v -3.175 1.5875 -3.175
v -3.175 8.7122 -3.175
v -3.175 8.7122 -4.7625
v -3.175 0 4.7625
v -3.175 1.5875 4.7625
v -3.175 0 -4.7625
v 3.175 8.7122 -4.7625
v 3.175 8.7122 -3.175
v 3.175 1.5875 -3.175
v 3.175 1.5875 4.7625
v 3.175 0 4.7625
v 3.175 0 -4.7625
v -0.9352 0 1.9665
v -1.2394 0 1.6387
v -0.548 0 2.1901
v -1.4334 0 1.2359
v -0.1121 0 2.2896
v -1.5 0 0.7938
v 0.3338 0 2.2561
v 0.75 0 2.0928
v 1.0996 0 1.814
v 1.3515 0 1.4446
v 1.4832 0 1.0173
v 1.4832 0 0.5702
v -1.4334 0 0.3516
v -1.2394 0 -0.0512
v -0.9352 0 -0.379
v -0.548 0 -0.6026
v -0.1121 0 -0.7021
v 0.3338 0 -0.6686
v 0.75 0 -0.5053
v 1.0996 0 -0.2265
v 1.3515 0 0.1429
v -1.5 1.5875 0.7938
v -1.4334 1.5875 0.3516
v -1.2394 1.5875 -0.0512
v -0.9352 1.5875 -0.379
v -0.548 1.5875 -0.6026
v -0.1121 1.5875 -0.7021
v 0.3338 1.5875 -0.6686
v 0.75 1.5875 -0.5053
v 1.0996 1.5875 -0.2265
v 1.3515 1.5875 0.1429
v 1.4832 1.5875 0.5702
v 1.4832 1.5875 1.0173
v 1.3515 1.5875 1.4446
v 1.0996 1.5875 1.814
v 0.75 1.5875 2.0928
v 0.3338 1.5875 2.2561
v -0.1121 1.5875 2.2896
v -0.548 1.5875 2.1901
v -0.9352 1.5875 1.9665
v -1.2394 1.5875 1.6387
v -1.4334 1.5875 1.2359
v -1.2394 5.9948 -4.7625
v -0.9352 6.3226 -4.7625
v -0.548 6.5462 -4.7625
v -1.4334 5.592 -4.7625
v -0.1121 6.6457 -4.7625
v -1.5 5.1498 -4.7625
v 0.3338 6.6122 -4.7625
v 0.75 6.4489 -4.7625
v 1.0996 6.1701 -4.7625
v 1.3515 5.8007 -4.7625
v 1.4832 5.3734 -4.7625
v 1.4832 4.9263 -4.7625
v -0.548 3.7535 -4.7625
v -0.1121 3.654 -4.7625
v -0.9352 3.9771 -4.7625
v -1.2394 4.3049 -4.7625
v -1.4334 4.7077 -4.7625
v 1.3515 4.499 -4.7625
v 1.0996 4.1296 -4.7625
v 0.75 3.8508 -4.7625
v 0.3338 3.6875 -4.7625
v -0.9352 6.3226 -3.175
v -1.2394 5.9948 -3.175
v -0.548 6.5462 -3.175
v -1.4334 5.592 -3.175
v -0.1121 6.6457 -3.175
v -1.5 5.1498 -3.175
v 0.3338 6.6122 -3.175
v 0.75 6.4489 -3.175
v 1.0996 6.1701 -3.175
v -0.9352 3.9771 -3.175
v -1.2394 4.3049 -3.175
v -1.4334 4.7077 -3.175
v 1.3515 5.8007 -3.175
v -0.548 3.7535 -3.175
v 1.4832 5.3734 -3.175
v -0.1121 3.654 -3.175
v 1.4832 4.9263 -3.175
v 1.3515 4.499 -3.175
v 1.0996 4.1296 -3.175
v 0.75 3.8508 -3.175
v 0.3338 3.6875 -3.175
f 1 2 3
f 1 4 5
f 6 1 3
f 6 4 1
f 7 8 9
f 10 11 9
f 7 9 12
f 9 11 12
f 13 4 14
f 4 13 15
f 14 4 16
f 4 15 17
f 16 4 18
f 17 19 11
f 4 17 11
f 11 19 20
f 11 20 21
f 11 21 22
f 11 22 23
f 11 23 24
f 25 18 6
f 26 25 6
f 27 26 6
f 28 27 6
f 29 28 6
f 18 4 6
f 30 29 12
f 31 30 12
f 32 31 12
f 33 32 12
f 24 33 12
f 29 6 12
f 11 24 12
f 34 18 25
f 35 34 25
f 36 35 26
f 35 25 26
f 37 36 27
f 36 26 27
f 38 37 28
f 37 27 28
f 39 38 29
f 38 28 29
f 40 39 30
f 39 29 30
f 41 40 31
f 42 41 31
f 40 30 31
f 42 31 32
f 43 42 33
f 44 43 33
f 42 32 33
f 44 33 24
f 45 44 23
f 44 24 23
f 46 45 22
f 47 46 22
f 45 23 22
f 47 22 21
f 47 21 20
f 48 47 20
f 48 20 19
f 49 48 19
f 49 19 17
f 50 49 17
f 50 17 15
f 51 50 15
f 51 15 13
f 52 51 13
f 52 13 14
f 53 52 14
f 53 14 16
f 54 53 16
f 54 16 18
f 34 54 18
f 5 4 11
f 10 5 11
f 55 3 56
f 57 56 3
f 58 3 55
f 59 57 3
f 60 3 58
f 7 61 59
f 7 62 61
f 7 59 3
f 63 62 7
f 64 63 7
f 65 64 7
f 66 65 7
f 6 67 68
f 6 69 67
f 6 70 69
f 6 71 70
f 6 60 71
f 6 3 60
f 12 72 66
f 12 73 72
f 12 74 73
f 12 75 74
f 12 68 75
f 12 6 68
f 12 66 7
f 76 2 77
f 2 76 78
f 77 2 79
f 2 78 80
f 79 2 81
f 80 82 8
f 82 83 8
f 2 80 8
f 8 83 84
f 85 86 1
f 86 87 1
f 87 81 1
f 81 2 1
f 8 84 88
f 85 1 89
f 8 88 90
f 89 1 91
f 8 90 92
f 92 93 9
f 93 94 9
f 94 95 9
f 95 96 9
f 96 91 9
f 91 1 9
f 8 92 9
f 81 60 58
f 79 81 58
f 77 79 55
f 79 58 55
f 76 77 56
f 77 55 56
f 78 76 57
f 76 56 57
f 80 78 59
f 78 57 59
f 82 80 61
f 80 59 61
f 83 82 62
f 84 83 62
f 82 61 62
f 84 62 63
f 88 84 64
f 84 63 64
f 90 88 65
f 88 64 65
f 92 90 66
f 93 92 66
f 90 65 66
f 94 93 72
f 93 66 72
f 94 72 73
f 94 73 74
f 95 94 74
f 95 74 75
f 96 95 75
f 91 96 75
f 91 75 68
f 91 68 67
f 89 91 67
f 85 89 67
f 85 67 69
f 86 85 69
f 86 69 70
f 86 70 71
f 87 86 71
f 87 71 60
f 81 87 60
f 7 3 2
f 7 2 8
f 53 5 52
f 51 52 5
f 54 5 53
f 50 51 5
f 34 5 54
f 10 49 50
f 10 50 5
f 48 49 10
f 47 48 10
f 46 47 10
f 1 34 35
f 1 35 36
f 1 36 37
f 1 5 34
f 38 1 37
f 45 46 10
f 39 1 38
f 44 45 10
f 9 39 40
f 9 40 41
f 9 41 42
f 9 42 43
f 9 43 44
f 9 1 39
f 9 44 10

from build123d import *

# Parameters (mm, degrees)
SKETCH1_W                 = 6.35
SKETCH1_H                 = 9.525
BOSS_EXTRUDE1_DEPTH       = 1.5875
SKETCH2_W                 = 6.35
SKETCH2_H                 = 1.5875
BOSS_EXTRUDE2_DEPTH       = 7.1247
F_3_0MM_DOWEL_HOLE1_D     = 3
F_3_0MM_DOWEL_HOLE2_D     = 3
F_3_0MM_DOWEL_HOLE2_DEPTH = 6.35
F_3_0MM_DOWEL_HOLE2_TIP   = 0.901290929


with BuildPart() as part:
    # Sketch1 → Boss-Extrude1 (new body)
    with BuildSketch(Plane(origin=(0, 0, 0), x_dir=(1, 0, 0), z_dir=(0, 1, 0))):
        Rectangle(SKETCH1_W, SKETCH1_H)
    extrude(amount=BOSS_EXTRUDE1_DEPTH)

    # Sketch2 → Boss-Extrude2 (add)
    with BuildSketch(Plane(origin=(0, 1.5875, 0), x_dir=(1, 0, 0), z_dir=(0, 1, 0))):
        with Locations((0, 3.96875)):
            Rectangle(SKETCH2_W, SKETCH2_H)
    extrude(amount=BOSS_EXTRUDE2_DEPTH)

    # Ø3.0mm Dowel Hole1 (through all)
    with Locations(Plane(origin=(0, 1.5875, 0), x_dir=(1, 0, 0), z_dir=(0, 1, 0))):
        with Locations((0, -0.79375)):
            Hole(F_3_0MM_DOWEL_HOLE1_D / 2)

    # Ø3.0mm Dowel Hole2
    with Locations(Plane.XY.offset(-3.175)):
        with Locations((0, 5.14985)):
            Hole(F_3_0MM_DOWEL_HOLE2_D / 2, depth=F_3_0MM_DOWEL_HOLE2_DEPTH)
            with Locations((0, 0, -(F_3_0MM_DOWEL_HOLE2_DEPTH + F_3_0MM_DOWEL_HOLE2_TIP / 2))):  # 118° drill point
                Cone(0, F_3_0MM_DOWEL_HOLE2_D / 2, F_3_0MM_DOWEL_HOLE2_TIP, mode=Mode.SUBTRACT)


solid = part.part
